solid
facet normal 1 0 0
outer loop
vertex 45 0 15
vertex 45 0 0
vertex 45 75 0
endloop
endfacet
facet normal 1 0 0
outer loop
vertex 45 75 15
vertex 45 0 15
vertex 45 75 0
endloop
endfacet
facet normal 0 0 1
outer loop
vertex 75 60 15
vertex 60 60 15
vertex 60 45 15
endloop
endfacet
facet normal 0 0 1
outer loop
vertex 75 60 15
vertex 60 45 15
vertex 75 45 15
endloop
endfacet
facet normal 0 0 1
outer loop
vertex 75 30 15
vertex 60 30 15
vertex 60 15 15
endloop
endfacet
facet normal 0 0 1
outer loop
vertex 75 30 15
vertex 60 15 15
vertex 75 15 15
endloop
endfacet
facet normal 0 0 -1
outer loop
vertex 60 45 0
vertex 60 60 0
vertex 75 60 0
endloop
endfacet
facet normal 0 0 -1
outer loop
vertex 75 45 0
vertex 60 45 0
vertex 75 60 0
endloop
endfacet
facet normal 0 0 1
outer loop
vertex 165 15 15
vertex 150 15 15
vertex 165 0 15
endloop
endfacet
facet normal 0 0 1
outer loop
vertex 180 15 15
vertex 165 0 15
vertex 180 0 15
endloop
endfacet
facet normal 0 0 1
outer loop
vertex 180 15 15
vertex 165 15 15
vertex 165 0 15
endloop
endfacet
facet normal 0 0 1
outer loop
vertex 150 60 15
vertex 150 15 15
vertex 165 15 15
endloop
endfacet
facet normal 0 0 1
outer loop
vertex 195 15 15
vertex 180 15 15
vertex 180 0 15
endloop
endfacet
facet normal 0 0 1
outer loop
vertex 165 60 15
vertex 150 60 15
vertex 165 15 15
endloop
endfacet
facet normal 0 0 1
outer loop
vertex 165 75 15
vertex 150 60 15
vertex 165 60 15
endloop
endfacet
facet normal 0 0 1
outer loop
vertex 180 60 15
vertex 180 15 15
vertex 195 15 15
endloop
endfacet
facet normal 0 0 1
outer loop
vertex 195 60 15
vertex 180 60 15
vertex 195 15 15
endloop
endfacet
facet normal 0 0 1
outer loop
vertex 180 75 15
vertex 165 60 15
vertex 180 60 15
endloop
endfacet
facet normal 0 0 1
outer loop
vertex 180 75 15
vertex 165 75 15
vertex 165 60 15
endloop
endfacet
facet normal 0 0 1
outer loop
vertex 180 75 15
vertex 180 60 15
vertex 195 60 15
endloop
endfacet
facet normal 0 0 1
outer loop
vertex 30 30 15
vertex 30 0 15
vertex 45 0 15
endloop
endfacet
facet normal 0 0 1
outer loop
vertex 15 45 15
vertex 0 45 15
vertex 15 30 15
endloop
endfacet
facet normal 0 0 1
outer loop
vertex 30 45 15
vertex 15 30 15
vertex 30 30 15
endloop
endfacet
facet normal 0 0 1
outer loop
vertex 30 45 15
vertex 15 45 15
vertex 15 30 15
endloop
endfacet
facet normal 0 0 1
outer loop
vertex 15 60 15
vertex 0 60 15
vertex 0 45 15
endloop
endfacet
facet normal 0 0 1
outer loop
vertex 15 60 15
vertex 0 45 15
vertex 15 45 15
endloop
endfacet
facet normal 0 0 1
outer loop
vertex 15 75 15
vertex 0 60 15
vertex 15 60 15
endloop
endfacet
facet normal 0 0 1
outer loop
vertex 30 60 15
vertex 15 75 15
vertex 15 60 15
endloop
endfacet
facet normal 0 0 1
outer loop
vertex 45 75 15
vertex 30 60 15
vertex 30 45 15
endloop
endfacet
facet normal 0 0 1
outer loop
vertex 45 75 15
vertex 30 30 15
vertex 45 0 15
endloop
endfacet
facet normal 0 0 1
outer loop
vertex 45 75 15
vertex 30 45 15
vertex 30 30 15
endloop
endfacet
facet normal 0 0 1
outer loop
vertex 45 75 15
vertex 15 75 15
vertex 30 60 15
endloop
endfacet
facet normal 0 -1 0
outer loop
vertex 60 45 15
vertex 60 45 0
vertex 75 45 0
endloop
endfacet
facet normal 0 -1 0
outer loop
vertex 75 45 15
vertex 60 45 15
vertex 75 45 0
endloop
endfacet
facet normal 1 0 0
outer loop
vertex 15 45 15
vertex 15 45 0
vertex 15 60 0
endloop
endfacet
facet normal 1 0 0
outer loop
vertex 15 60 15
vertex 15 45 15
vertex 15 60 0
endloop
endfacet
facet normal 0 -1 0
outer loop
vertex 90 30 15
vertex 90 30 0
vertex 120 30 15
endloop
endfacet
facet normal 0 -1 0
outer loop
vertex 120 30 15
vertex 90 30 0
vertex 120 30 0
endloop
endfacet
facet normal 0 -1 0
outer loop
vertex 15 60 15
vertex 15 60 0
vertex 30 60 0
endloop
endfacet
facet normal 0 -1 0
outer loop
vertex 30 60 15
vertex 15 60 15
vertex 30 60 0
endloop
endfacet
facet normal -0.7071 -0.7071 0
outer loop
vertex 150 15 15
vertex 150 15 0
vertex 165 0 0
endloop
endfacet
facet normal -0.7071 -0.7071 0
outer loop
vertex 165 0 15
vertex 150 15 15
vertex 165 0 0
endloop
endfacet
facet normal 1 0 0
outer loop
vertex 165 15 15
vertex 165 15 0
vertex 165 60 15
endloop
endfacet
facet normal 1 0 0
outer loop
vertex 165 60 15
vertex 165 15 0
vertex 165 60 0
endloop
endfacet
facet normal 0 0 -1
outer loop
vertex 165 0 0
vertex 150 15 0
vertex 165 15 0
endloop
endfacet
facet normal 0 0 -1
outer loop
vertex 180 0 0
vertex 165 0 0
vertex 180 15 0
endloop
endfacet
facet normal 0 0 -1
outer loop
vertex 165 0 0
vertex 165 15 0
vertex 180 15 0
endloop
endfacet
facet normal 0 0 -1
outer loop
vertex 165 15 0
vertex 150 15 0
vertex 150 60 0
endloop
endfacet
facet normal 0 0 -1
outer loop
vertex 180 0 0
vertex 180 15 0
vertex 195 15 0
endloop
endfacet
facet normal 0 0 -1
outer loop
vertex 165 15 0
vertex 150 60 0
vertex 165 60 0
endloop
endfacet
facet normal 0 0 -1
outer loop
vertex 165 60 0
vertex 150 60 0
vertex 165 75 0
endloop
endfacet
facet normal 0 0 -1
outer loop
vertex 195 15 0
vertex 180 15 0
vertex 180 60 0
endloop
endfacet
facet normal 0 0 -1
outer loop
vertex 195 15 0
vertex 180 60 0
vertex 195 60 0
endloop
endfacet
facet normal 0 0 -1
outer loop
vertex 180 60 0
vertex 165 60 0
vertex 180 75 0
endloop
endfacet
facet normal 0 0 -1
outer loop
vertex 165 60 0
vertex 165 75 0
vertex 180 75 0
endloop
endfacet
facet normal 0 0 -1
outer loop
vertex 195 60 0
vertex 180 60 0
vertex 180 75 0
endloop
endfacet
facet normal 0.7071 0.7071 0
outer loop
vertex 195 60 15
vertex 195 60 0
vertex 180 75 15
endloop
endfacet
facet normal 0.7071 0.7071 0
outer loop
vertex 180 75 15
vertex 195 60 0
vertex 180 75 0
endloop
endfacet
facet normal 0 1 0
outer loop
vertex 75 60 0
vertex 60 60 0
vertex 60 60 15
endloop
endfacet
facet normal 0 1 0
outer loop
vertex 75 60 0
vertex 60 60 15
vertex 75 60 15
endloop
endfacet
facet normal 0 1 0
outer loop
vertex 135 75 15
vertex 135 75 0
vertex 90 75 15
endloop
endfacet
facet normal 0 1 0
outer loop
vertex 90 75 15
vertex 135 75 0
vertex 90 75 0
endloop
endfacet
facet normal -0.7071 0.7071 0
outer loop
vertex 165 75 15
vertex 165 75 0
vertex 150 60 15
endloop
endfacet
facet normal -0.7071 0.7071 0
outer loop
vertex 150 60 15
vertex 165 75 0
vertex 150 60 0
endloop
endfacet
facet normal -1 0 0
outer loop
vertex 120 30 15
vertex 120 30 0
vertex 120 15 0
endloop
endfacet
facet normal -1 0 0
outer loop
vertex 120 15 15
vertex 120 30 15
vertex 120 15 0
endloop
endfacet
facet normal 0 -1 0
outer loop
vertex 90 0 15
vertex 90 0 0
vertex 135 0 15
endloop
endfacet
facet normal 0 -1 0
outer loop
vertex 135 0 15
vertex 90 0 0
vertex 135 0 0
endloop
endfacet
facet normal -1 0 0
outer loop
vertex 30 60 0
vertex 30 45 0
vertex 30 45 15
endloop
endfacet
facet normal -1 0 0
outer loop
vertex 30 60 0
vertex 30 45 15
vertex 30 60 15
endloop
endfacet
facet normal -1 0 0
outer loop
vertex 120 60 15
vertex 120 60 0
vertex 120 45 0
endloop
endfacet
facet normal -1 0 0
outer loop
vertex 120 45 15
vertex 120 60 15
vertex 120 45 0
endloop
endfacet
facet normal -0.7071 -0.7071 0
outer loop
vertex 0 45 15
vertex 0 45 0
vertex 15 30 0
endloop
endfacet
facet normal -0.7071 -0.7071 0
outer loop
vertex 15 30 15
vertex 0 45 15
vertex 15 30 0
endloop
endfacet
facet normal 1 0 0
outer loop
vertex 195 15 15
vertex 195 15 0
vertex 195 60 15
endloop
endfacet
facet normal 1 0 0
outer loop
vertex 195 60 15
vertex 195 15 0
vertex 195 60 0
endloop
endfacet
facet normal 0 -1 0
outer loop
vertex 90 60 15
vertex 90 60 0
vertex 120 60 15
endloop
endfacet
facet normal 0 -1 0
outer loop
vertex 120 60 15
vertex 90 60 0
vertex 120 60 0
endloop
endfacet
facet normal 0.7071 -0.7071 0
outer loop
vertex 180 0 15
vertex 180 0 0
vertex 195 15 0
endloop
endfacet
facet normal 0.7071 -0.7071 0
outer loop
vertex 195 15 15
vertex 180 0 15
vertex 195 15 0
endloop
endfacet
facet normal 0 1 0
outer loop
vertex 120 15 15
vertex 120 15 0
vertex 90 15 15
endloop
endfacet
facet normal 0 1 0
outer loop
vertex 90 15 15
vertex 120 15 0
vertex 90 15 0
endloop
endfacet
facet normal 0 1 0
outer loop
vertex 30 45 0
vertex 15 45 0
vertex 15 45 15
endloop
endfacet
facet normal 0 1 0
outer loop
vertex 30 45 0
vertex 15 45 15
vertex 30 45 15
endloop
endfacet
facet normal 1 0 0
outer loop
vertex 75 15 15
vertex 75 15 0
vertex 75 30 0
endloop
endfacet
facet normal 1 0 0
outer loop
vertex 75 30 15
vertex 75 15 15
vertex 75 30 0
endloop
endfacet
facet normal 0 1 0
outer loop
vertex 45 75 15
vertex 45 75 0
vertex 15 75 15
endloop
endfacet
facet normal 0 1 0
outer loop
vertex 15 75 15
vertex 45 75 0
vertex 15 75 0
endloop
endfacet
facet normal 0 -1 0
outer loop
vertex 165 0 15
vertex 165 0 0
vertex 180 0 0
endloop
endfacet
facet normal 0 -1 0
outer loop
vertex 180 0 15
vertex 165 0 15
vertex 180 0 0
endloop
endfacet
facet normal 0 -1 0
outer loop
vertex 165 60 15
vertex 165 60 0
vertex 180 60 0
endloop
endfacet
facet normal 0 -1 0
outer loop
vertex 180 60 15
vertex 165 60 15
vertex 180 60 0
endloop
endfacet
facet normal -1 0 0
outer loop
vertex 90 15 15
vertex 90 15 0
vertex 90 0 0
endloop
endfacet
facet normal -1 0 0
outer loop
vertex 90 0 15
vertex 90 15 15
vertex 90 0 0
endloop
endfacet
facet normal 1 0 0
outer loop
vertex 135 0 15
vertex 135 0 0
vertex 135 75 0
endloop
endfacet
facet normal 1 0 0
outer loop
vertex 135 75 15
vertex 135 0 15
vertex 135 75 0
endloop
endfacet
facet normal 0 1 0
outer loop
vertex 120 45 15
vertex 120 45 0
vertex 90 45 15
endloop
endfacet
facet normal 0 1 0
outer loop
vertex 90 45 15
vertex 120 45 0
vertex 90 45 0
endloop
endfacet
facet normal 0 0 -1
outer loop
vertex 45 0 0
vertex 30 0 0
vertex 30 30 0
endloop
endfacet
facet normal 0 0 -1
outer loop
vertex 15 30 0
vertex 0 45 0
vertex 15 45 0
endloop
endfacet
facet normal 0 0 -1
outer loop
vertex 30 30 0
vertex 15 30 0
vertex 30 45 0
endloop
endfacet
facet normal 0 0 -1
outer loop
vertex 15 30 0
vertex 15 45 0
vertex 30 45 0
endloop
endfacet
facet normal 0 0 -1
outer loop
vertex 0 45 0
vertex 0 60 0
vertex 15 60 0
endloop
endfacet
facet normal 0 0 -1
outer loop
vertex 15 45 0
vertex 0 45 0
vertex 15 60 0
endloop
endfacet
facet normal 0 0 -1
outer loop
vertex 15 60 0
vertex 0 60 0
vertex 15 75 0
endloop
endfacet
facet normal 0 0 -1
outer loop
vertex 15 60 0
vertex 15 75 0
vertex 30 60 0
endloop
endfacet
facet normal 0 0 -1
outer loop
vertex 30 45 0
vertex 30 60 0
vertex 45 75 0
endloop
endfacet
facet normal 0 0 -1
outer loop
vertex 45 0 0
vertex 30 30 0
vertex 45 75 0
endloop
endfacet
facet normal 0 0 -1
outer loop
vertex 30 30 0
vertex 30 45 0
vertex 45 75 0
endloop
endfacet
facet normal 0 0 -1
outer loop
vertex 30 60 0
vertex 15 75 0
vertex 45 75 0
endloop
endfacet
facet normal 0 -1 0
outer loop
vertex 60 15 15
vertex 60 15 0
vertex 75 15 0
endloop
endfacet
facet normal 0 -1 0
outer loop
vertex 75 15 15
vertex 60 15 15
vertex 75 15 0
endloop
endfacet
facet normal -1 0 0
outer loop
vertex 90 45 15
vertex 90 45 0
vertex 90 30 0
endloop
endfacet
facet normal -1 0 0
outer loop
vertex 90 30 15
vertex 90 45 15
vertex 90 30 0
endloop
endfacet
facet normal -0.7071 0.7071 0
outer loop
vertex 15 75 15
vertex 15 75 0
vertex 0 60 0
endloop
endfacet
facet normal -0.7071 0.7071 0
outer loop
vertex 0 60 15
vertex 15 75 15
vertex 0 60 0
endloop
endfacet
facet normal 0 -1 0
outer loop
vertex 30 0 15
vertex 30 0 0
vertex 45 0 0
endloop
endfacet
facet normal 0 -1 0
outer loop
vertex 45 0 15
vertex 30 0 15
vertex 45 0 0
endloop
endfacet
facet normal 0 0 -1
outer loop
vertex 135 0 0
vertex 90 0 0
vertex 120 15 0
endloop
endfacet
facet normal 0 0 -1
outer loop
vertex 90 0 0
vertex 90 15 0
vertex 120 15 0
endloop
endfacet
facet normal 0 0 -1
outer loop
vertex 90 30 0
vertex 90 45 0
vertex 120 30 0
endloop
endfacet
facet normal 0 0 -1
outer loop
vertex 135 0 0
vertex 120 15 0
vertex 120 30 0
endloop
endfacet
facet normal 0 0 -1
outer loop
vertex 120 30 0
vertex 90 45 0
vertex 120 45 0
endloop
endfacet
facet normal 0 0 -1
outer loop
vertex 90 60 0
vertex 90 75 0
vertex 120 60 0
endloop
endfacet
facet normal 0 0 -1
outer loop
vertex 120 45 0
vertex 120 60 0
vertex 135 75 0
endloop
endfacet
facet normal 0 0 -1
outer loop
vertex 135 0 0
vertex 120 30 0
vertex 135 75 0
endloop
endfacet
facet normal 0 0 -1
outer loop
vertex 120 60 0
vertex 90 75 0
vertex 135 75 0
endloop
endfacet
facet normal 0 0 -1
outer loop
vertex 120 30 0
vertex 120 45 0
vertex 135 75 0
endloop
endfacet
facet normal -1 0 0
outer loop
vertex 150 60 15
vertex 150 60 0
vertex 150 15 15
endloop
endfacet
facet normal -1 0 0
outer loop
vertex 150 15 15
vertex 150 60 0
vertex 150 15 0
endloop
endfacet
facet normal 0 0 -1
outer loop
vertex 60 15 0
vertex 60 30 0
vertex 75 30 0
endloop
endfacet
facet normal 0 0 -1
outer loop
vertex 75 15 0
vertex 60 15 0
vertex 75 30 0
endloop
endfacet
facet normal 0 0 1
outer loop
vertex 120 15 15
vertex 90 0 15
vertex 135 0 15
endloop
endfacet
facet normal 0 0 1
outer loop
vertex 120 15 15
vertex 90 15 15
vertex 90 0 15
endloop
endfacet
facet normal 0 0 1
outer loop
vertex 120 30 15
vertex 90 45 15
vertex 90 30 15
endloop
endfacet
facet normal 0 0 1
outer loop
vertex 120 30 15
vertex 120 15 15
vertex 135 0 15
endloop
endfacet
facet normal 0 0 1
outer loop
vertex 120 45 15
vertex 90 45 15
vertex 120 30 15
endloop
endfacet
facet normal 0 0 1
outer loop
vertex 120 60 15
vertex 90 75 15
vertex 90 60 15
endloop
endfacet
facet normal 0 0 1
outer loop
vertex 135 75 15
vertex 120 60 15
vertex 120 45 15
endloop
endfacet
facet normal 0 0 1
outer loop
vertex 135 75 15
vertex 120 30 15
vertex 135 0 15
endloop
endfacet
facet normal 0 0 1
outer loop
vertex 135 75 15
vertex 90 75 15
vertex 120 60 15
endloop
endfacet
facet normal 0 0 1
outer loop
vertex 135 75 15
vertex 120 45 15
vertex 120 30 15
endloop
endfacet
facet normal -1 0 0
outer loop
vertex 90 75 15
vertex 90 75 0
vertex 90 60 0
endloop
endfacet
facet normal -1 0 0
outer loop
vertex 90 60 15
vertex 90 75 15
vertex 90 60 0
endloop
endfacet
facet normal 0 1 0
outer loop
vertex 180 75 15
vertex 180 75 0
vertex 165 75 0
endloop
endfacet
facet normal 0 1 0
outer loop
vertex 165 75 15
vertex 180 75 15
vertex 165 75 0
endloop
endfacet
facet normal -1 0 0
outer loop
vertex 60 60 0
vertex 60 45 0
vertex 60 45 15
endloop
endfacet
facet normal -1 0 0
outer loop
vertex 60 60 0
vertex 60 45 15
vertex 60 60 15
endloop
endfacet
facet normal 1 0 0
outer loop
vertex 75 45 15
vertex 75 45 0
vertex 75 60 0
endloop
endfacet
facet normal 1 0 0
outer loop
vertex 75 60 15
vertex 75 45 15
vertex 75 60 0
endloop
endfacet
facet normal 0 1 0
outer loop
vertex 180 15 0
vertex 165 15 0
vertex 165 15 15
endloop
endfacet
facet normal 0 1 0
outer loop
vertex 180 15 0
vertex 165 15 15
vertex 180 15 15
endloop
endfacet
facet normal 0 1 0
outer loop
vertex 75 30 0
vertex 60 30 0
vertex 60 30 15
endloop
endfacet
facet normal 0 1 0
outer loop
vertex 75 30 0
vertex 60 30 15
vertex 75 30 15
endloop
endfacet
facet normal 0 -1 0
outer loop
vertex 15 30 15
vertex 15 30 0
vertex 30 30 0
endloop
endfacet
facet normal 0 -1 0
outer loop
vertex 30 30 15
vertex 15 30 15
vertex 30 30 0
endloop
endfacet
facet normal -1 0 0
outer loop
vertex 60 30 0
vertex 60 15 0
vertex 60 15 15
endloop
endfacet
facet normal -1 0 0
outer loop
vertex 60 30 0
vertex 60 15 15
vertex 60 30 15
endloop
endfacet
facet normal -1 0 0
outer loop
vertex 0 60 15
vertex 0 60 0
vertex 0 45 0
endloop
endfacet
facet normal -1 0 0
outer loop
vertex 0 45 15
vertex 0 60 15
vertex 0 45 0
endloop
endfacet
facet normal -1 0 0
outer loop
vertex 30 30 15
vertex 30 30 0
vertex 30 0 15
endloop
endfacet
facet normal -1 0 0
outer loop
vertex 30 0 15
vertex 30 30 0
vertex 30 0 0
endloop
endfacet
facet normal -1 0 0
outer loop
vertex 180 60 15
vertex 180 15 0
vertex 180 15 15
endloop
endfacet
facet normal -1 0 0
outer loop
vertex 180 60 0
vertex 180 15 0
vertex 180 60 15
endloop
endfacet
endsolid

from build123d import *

# Parameters (mm, degrees)
SKETCH1_W        = 15
SKETCH1_H        = 15
EXTRUDE1_DEPTH   = 15
EXTRUDE1_2_DEPTH = 15
SKETCH1_H_2      = 45
EXTRUDE1_3_DEPTH = 15
EXTRUDE1_4_DEPTH = 15
EXTRUDE1_5_DEPTH = 15


with BuildPart() as part:
    # Sketch1 → Extrude1 (new body)
    with BuildSketch(Plane.XY):
        Polygon((30, 0), (45, 0), (45, 75), (15, 75), (0, 60), (0, 45), (15, 30), (30, 30), align=None)
        with Locations((22.5, 52.5)):
            Rectangle(SKETCH1_W, SKETCH1_H, mode=Mode.SUBTRACT)
    extrude(amount=EXTRUDE1_DEPTH)


with BuildPart() as body_2:
    # Sketch1 → Extrude1 2 (new body)
    with BuildSketch(Plane.XY):
        Polygon((90, 0), (135, 0), (135, 75), (90, 75), (90, 60), (120, 60), (120, 45), (90, 45), (90, 30), (120, 30), (120, 15), (90, 15), align=None)
    extrude(amount=EXTRUDE1_2_DEPTH)


with BuildPart() as body_3:
    # Sketch1 → Extrude1 3 (new body)
    with BuildSketch(Plane.XY):
        Polygon((195, 15), (195, 60), (180, 75), (165, 75), (150, 60), (150, 15), (165, 0), (180, 0), align=None)
        with Locations((172.5, 37.5)):
            Rectangle(SKETCH1_W, SKETCH1_H_2, mode=Mode.SUBTRACT)
    extrude(amount=EXTRUDE1_3_DEPTH)


with BuildPart() as body_4:
    # Sketch1 → Extrude1 4 (new body)
    with BuildSketch(Plane.XY):
        with Locations((67.5, 22.5)):
            Rectangle(SKETCH1_W, SKETCH1_H)
    extrude(amount=EXTRUDE1_4_DEPTH)


with BuildPart() as body_5:
    # Sketch1 → Extrude1 5 (new body)
    with BuildSketch(Plane.XY):
        with Locations((67.5, 52.5)):
            Rectangle(SKETCH1_W, SKETCH1_H)
    extrude(amount=EXTRUDE1_5_DEPTH)


solid = Compound([part.part, body_2.part, body_3.part, body_4.part, body_5.part])
